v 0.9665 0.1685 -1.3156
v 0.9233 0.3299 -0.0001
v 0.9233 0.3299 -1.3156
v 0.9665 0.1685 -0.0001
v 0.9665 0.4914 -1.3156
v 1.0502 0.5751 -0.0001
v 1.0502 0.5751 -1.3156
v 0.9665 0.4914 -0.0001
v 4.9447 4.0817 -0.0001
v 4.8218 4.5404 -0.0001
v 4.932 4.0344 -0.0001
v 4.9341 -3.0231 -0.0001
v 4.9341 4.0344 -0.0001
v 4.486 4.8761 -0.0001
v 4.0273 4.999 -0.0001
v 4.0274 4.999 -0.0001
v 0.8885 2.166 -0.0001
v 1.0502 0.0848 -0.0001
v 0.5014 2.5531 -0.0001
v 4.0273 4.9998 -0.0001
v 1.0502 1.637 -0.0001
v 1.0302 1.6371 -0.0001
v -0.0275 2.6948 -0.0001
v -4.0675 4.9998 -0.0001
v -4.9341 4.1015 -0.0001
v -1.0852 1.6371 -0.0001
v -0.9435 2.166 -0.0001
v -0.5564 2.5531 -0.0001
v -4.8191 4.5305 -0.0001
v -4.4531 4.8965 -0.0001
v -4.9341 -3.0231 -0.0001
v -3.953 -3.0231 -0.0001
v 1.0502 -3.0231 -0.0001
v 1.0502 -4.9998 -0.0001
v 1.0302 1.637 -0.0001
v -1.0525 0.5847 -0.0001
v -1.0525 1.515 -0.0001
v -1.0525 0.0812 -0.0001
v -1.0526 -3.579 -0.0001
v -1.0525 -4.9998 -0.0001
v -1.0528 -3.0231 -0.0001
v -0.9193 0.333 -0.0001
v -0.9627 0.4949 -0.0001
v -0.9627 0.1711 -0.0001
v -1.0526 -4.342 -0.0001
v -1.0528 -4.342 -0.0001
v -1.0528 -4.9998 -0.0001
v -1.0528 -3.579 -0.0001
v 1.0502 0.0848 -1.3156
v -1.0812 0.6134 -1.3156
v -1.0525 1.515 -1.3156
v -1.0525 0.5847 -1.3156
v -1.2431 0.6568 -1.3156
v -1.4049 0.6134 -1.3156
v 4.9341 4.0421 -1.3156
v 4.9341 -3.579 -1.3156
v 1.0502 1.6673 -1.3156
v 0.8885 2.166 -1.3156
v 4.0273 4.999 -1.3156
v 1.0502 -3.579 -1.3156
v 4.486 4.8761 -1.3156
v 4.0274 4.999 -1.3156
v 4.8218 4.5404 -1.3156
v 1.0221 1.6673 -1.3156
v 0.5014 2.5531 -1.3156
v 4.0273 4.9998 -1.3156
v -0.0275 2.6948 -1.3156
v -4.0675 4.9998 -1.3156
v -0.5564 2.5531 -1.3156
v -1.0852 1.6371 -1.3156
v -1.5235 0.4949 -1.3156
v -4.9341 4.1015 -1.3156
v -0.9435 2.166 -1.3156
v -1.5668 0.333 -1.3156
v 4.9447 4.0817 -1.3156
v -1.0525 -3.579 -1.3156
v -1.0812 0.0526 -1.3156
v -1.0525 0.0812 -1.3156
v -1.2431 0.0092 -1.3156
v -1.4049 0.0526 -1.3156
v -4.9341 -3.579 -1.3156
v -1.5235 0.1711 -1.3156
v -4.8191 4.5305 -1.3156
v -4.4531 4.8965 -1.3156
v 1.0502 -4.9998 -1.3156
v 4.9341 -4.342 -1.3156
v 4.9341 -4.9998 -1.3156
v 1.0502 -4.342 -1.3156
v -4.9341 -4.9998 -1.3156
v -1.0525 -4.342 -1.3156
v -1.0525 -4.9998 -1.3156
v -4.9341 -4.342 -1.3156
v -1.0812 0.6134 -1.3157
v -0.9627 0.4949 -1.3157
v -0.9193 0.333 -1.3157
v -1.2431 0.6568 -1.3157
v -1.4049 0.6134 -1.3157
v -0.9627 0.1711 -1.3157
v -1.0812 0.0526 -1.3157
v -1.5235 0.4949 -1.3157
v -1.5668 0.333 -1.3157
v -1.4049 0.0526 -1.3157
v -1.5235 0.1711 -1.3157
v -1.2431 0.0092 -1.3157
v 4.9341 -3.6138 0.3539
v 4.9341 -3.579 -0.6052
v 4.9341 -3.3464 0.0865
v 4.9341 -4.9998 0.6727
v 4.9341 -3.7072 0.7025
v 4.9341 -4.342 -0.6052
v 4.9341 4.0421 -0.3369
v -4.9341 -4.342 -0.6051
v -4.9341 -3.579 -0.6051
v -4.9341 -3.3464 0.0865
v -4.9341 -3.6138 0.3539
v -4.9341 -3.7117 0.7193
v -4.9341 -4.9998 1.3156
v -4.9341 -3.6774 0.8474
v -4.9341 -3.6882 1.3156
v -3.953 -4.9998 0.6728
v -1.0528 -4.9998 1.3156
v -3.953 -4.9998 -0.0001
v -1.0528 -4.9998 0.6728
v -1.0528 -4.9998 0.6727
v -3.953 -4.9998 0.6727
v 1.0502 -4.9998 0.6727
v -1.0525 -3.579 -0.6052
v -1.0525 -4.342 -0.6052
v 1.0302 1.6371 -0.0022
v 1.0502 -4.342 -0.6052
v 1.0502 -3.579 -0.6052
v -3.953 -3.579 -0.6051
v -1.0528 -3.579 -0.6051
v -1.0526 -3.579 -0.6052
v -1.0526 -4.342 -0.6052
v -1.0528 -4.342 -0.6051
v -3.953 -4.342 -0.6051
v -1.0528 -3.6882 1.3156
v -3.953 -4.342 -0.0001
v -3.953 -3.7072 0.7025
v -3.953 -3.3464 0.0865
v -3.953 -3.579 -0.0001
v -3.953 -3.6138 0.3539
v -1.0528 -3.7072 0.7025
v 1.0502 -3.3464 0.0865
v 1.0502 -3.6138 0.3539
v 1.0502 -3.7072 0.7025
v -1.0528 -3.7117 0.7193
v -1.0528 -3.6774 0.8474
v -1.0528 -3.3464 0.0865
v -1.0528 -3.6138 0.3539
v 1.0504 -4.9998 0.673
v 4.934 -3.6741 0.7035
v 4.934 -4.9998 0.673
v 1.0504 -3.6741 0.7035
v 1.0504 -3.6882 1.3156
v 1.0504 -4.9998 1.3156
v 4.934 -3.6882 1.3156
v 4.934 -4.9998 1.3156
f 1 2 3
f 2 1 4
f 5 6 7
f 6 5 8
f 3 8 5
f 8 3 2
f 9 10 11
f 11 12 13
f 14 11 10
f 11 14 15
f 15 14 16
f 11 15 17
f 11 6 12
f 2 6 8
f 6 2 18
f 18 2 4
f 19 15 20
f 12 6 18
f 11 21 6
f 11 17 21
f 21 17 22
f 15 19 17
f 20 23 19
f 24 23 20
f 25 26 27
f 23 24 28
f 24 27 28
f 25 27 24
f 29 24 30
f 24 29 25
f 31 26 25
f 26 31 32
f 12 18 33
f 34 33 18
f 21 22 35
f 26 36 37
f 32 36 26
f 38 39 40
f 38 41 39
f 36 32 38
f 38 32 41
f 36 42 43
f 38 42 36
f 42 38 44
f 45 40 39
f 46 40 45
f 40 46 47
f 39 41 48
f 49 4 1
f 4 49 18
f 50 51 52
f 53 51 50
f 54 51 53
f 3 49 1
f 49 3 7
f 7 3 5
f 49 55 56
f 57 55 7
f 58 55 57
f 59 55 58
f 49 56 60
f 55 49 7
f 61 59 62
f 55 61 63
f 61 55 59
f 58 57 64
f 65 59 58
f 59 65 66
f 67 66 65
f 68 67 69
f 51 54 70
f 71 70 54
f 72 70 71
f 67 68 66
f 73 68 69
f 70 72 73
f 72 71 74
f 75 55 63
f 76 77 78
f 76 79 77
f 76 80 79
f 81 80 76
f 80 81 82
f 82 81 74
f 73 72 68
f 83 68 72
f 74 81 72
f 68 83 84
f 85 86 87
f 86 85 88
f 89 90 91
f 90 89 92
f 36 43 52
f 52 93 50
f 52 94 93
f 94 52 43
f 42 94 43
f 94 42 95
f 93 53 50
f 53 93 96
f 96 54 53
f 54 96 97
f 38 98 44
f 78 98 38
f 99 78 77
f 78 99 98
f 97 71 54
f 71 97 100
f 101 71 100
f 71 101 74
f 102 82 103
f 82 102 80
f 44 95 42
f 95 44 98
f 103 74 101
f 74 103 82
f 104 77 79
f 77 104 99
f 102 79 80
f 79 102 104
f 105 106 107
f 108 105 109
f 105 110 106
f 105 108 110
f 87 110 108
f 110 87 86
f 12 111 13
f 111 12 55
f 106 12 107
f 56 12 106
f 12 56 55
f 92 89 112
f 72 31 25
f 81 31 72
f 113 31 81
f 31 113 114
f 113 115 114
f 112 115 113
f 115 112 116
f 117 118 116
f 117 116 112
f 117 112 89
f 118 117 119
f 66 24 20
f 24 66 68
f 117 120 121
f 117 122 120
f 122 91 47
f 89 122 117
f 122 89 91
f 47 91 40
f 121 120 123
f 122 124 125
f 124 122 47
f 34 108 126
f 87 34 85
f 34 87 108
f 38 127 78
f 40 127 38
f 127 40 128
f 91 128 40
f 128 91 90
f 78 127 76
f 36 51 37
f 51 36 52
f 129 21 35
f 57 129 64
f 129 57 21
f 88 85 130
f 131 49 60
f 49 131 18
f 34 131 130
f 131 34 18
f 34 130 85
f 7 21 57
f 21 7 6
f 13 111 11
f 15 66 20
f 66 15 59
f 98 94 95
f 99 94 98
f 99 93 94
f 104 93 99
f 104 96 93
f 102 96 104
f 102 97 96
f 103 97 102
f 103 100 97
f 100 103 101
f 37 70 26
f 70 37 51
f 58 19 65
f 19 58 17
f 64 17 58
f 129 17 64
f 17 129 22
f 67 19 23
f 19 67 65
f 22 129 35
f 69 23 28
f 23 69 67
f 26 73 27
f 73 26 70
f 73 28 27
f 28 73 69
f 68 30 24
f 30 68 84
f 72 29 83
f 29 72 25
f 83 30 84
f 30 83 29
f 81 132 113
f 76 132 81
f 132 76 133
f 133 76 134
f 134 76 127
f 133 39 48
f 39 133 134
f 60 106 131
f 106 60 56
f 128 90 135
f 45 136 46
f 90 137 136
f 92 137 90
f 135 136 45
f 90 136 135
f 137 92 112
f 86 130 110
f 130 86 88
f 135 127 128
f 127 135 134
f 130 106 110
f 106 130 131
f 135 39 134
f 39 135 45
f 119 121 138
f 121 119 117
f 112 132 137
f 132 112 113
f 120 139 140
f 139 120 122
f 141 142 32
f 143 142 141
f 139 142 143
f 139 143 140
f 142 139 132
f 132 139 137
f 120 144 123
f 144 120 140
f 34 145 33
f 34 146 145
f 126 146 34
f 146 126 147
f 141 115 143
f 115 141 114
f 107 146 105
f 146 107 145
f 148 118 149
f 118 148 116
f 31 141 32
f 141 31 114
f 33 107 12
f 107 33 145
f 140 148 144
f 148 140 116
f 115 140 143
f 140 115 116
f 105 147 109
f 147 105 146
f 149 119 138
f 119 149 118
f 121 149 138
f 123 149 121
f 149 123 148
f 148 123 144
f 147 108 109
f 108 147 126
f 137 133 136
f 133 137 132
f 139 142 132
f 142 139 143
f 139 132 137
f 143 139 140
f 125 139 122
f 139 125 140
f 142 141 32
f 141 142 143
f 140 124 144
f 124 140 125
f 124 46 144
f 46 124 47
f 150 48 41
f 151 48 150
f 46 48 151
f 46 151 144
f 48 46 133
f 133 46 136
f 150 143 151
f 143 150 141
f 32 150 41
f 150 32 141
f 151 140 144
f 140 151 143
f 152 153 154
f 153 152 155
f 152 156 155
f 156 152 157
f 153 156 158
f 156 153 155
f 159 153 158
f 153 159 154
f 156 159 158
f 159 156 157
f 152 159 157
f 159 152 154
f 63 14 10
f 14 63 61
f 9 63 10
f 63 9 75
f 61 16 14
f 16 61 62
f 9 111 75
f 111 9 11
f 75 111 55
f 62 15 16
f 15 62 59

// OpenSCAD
intersection() {
  cube(size = [11.8418, 11.9997, 3.1576], center = true);

  union() {
    union() {
      difference() {
        difference() {
          union() {
            union() {
              translate([1.24614, 0.32995, -0.657895])
              cylinder(h = 1.31549, r1 = 0.32288, r2 = 0.32288, center = true, $fn = 12);
            
              translate([-1.24306, 0.33299, -9.1])
              cylinder(h = 18.1997, r1 = 0.32378, r2 = 0.32378, center = true, $fn = 12);
            }
          
            difference() {
              translate([0, 0, -0.657895])
              cube(size = [9.86812, 9.9997, 1.31549], center = true);
            
              translate([-0.00116301, -8.27945, -0.190634])
              rotate([-178.681, 0, 0])
              cube(size = [2.10273, 19.8365, 36.3998], center = true);
            }
          }
        
          difference() {
            union() {
              translate([-1.45142, 0.534586, 0.0123088])
              rotate([-178.681, 0, 0])
              cube(size = [5.00325, 6.99658, 36.3998], center = true);
            
              translate([0.49053, 11.1137, 0.255891])
              rotate([-178.681, 0, 0])
              cube(size = [8.88716, 14.1667, 36.3998], center = true);
            }
          
            difference() {
              translate([0.03711, 7.31053, -0.657895])
              cube(size = [7.98042, 21.7788, 1.31569], center = true);
            
              translate([-0.0275, 1.63709, -0.657895])
              cylinder(h = 1.31579, r1 = 1.05773, r2 = 1.05773, center = true, $fn = 12);
            }
          }
        }
      
        difference() {
          union() {
            translate([-6.6329, -3.96053, 0])
            cube(size = [23.134, 0.76296, 2.63138], center = true);
          
            difference() {
              translate([-11.0766, 11.3141, -8.44792])
              rotate([-178.681, 0, 0])
              cube(size = [14.2467, 14.1667, 18.9876], center = true);
            
              translate([-3.95315, 4.03059, 8.77776e-16])
              cylinder(h = 36.3999, r1 = 0.99991, r2 = 0.99991, center = true, $fn = 12);
            }
          }
        
          translate([8.57369, 0, 0.355265])
          cube(size = [19.2525, 36.3999, 1.92095], center = true);
        }
      }
    
      union() {
        intersection() {
          difference() {
            difference() {
              translate([0, 6.6, 0.355265])
              cube(size = [9.86812, 23.1997, 1.92075], center = true);
            
              translate([-6.6329, 7.61615, 0.175362])
              rotate([-178.681, 0, 0])
              cube(size = [23.134, 21.1635, 36.3998], center = true);
            }
          
            union() {
              translate([-1.45142, -10.3786, -8.94739])
              rotate([-178.681, 0, 0])
              cube(size = [5.00325, 15.2361, 18.9876], center = true);
            
              translate([6.6329, -2.98097, 0.71933])
              rotate([0, 90, 0])
              cylinder(h = 23.134, r1 = 0.73077, r2 = 0.73077, center = true, $fn = 12);
            }
          }
        
          union() {
            union() {
              translate([-11.5671, -2.98097, 0.71933])
              rotate([0, 90, 0])
              cylinder(h = 13.2655, r1 = 0.73077, r2 = 0.73077, center = true, $fn = 12);
            
              translate([11.1137, -10.7251, -8.95537])
              rotate([-178.681, 0, 0])
              cube(size = [14.1723, 14.5429, 18.9875], center = true);
            }
          
            union() {
              translate([-2.99342, -10.9255, -0.251559])
              rotate([-178.681, 0, 0])
              cube(size = [3.88128, 14.5429, 36.3997], center = true);
            
              translate([0, -10.3786, -8.94739])
              rotate([-178.681, 0, 0])
              cube(size = [9.86812, 15.236, 18.9875], center = true);
            }
          }
        }
      
        union() {
          difference() {
            intersection() {
              translate([0.03711, 6.6, 0.355265])
              cube(size = [7.98022, 23.1997, 1.92075], center = true);
            
              translate([-2.50289, -10.3786, -8.94739])
              rotate([-178.681, 0, 0])
              cube(size = [2.90022, 15.236, 18.9875], center = true);
            }
          
            union() {
              translate([1.48737, -11.2711, 9.1])
              cube(size = [5.0798, 13.8577, 18.1998], center = true);
            
              translate([0.03711, -2.98097, 0.71933])
              rotate([0, 90, 0])
              cylinder(h = 7.98032, r1 = 0.73077, r2 = 0.73077, center = true, $fn = 12);
            }
          }
        
          union() {
            intersection() {
              translate([9.62515, -11.144, 9.23981])
              rotate([-178.681, 0, 0])
              cube(size = [17.1494, 14.5429, 17.4119], center = true);
            
              translate([-6.6329, -4.28947, 0.657895])
              cube(size = [23.1339, 1.42075, 1.31549], center = true);
            }
          
            translate([4.02737, 4.08172, -0.657895])
            cylinder(h = 1.31549, r1 = 0.9173, r2 = 0.9173, center = true, $fn = 12);
          }
        }
      }
    }
  }
}
